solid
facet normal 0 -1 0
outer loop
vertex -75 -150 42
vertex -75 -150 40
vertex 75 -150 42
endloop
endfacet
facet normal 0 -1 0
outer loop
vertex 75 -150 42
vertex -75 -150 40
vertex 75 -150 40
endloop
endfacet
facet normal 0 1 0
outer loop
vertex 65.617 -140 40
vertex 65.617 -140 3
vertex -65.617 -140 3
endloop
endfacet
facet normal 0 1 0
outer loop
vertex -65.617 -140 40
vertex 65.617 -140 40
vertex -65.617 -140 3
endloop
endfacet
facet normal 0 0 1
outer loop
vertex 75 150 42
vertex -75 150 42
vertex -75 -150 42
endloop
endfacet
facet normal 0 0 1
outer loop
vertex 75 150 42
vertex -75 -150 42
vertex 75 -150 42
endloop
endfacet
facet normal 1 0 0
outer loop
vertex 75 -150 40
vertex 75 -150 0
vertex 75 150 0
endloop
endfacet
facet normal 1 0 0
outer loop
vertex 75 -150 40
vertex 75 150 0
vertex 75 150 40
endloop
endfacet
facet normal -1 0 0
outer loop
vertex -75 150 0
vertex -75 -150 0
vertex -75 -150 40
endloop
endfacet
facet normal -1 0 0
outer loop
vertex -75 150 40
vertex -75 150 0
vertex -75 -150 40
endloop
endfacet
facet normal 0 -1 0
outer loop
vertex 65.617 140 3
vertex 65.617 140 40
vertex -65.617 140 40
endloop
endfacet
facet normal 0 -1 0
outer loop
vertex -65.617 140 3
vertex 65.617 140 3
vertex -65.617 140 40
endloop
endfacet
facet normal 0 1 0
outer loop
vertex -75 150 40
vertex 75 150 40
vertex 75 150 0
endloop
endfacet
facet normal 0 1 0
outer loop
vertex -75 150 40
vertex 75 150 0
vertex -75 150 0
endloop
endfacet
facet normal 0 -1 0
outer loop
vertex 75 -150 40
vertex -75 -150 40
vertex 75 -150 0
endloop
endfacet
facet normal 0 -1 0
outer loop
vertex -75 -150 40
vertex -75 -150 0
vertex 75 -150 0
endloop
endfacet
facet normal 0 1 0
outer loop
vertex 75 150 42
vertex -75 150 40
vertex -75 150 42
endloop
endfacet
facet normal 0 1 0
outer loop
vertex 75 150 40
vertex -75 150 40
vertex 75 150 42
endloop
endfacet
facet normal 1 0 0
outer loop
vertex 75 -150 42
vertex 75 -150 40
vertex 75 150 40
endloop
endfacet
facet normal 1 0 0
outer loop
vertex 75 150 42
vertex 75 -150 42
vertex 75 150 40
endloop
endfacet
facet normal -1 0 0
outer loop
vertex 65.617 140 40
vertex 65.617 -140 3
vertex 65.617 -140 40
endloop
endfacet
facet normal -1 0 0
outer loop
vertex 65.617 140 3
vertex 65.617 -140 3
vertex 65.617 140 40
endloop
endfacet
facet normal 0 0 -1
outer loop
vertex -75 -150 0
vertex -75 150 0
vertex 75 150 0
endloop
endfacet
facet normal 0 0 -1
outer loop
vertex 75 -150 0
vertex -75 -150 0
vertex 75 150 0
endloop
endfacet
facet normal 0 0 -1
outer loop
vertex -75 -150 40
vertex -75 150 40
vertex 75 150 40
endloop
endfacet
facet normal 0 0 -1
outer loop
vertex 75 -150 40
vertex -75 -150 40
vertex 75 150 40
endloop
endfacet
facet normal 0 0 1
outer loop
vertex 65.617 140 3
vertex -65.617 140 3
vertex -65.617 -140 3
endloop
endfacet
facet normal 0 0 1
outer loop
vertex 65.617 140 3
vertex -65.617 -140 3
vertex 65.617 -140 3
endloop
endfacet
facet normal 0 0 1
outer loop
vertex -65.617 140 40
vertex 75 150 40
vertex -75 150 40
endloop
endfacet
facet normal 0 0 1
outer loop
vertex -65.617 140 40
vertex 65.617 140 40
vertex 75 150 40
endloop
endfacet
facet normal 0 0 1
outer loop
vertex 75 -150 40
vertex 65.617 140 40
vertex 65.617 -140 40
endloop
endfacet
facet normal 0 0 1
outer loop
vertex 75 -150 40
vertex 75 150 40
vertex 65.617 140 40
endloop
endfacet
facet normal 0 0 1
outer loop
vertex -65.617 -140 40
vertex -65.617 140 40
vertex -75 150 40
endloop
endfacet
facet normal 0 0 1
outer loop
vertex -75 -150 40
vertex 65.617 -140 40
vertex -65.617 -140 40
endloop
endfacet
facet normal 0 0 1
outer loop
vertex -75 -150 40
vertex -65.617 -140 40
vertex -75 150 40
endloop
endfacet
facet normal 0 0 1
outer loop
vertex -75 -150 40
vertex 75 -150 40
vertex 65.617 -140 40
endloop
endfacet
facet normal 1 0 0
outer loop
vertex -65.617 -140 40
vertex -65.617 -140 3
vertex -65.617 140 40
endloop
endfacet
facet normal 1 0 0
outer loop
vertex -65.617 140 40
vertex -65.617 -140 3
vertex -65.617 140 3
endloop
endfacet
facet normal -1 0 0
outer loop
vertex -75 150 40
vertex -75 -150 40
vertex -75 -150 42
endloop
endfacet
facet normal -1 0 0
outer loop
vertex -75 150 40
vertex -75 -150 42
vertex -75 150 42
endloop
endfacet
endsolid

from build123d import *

# Parameters (mm, degrees)
F0_W     = 150
F0_H     = 300
F1_DEPTH = 3
F2_W     = 9.3829005957
F2_H     = 280
F3_DEPTH = 37
F5_W     = 150
F5_H     = 37
F6_DEPTH = 10
F7_W     = 150
F7_H     = 300
F8_DEPTH = 2


with BuildPart() as f1:
    # F0 (on Top) → F1 (new body)
    with BuildSketch(Plane.XY):
        Rectangle(F0_W, F0_H)
    extrude(amount=F1_DEPTH)

    # F2 (on face) → F3 (join)
    with BuildSketch(Plane.XY.offset(3)):
        Polygon((-75, -140), (-75, -150), (75, -150), (75, -140), (65.6170994043, -140), align=None)
        with Locations((70.3085497022, 0)):
            Rectangle(F2_W, F2_H)
    extrude(amount=F3_DEPTH)

    # F4: F1 across plane


with BuildPart() as f1_1:
    add(f1.part)
    add(f1.part.mirror(Plane.YZ))

    # F5 (on face) → F6 (join)
    with BuildSketch(Plane(origin=(0, 140, 0), x_dir=(-1, 0, 0), z_dir=(0, 1, 0))):
        with Locations((0, 21.5)):
            Rectangle(F5_W, F5_H)
    extrude(amount=F6_DEPTH)


with BuildPart() as f8:
    # F7 (on face) → F8 (new body)
    with BuildSketch(Plane.XY.offset(40)):
        Rectangle(F7_W, F7_H)
    extrude(amount=F8_DEPTH)


solid = Compound([f1_1.part, f8.part])
